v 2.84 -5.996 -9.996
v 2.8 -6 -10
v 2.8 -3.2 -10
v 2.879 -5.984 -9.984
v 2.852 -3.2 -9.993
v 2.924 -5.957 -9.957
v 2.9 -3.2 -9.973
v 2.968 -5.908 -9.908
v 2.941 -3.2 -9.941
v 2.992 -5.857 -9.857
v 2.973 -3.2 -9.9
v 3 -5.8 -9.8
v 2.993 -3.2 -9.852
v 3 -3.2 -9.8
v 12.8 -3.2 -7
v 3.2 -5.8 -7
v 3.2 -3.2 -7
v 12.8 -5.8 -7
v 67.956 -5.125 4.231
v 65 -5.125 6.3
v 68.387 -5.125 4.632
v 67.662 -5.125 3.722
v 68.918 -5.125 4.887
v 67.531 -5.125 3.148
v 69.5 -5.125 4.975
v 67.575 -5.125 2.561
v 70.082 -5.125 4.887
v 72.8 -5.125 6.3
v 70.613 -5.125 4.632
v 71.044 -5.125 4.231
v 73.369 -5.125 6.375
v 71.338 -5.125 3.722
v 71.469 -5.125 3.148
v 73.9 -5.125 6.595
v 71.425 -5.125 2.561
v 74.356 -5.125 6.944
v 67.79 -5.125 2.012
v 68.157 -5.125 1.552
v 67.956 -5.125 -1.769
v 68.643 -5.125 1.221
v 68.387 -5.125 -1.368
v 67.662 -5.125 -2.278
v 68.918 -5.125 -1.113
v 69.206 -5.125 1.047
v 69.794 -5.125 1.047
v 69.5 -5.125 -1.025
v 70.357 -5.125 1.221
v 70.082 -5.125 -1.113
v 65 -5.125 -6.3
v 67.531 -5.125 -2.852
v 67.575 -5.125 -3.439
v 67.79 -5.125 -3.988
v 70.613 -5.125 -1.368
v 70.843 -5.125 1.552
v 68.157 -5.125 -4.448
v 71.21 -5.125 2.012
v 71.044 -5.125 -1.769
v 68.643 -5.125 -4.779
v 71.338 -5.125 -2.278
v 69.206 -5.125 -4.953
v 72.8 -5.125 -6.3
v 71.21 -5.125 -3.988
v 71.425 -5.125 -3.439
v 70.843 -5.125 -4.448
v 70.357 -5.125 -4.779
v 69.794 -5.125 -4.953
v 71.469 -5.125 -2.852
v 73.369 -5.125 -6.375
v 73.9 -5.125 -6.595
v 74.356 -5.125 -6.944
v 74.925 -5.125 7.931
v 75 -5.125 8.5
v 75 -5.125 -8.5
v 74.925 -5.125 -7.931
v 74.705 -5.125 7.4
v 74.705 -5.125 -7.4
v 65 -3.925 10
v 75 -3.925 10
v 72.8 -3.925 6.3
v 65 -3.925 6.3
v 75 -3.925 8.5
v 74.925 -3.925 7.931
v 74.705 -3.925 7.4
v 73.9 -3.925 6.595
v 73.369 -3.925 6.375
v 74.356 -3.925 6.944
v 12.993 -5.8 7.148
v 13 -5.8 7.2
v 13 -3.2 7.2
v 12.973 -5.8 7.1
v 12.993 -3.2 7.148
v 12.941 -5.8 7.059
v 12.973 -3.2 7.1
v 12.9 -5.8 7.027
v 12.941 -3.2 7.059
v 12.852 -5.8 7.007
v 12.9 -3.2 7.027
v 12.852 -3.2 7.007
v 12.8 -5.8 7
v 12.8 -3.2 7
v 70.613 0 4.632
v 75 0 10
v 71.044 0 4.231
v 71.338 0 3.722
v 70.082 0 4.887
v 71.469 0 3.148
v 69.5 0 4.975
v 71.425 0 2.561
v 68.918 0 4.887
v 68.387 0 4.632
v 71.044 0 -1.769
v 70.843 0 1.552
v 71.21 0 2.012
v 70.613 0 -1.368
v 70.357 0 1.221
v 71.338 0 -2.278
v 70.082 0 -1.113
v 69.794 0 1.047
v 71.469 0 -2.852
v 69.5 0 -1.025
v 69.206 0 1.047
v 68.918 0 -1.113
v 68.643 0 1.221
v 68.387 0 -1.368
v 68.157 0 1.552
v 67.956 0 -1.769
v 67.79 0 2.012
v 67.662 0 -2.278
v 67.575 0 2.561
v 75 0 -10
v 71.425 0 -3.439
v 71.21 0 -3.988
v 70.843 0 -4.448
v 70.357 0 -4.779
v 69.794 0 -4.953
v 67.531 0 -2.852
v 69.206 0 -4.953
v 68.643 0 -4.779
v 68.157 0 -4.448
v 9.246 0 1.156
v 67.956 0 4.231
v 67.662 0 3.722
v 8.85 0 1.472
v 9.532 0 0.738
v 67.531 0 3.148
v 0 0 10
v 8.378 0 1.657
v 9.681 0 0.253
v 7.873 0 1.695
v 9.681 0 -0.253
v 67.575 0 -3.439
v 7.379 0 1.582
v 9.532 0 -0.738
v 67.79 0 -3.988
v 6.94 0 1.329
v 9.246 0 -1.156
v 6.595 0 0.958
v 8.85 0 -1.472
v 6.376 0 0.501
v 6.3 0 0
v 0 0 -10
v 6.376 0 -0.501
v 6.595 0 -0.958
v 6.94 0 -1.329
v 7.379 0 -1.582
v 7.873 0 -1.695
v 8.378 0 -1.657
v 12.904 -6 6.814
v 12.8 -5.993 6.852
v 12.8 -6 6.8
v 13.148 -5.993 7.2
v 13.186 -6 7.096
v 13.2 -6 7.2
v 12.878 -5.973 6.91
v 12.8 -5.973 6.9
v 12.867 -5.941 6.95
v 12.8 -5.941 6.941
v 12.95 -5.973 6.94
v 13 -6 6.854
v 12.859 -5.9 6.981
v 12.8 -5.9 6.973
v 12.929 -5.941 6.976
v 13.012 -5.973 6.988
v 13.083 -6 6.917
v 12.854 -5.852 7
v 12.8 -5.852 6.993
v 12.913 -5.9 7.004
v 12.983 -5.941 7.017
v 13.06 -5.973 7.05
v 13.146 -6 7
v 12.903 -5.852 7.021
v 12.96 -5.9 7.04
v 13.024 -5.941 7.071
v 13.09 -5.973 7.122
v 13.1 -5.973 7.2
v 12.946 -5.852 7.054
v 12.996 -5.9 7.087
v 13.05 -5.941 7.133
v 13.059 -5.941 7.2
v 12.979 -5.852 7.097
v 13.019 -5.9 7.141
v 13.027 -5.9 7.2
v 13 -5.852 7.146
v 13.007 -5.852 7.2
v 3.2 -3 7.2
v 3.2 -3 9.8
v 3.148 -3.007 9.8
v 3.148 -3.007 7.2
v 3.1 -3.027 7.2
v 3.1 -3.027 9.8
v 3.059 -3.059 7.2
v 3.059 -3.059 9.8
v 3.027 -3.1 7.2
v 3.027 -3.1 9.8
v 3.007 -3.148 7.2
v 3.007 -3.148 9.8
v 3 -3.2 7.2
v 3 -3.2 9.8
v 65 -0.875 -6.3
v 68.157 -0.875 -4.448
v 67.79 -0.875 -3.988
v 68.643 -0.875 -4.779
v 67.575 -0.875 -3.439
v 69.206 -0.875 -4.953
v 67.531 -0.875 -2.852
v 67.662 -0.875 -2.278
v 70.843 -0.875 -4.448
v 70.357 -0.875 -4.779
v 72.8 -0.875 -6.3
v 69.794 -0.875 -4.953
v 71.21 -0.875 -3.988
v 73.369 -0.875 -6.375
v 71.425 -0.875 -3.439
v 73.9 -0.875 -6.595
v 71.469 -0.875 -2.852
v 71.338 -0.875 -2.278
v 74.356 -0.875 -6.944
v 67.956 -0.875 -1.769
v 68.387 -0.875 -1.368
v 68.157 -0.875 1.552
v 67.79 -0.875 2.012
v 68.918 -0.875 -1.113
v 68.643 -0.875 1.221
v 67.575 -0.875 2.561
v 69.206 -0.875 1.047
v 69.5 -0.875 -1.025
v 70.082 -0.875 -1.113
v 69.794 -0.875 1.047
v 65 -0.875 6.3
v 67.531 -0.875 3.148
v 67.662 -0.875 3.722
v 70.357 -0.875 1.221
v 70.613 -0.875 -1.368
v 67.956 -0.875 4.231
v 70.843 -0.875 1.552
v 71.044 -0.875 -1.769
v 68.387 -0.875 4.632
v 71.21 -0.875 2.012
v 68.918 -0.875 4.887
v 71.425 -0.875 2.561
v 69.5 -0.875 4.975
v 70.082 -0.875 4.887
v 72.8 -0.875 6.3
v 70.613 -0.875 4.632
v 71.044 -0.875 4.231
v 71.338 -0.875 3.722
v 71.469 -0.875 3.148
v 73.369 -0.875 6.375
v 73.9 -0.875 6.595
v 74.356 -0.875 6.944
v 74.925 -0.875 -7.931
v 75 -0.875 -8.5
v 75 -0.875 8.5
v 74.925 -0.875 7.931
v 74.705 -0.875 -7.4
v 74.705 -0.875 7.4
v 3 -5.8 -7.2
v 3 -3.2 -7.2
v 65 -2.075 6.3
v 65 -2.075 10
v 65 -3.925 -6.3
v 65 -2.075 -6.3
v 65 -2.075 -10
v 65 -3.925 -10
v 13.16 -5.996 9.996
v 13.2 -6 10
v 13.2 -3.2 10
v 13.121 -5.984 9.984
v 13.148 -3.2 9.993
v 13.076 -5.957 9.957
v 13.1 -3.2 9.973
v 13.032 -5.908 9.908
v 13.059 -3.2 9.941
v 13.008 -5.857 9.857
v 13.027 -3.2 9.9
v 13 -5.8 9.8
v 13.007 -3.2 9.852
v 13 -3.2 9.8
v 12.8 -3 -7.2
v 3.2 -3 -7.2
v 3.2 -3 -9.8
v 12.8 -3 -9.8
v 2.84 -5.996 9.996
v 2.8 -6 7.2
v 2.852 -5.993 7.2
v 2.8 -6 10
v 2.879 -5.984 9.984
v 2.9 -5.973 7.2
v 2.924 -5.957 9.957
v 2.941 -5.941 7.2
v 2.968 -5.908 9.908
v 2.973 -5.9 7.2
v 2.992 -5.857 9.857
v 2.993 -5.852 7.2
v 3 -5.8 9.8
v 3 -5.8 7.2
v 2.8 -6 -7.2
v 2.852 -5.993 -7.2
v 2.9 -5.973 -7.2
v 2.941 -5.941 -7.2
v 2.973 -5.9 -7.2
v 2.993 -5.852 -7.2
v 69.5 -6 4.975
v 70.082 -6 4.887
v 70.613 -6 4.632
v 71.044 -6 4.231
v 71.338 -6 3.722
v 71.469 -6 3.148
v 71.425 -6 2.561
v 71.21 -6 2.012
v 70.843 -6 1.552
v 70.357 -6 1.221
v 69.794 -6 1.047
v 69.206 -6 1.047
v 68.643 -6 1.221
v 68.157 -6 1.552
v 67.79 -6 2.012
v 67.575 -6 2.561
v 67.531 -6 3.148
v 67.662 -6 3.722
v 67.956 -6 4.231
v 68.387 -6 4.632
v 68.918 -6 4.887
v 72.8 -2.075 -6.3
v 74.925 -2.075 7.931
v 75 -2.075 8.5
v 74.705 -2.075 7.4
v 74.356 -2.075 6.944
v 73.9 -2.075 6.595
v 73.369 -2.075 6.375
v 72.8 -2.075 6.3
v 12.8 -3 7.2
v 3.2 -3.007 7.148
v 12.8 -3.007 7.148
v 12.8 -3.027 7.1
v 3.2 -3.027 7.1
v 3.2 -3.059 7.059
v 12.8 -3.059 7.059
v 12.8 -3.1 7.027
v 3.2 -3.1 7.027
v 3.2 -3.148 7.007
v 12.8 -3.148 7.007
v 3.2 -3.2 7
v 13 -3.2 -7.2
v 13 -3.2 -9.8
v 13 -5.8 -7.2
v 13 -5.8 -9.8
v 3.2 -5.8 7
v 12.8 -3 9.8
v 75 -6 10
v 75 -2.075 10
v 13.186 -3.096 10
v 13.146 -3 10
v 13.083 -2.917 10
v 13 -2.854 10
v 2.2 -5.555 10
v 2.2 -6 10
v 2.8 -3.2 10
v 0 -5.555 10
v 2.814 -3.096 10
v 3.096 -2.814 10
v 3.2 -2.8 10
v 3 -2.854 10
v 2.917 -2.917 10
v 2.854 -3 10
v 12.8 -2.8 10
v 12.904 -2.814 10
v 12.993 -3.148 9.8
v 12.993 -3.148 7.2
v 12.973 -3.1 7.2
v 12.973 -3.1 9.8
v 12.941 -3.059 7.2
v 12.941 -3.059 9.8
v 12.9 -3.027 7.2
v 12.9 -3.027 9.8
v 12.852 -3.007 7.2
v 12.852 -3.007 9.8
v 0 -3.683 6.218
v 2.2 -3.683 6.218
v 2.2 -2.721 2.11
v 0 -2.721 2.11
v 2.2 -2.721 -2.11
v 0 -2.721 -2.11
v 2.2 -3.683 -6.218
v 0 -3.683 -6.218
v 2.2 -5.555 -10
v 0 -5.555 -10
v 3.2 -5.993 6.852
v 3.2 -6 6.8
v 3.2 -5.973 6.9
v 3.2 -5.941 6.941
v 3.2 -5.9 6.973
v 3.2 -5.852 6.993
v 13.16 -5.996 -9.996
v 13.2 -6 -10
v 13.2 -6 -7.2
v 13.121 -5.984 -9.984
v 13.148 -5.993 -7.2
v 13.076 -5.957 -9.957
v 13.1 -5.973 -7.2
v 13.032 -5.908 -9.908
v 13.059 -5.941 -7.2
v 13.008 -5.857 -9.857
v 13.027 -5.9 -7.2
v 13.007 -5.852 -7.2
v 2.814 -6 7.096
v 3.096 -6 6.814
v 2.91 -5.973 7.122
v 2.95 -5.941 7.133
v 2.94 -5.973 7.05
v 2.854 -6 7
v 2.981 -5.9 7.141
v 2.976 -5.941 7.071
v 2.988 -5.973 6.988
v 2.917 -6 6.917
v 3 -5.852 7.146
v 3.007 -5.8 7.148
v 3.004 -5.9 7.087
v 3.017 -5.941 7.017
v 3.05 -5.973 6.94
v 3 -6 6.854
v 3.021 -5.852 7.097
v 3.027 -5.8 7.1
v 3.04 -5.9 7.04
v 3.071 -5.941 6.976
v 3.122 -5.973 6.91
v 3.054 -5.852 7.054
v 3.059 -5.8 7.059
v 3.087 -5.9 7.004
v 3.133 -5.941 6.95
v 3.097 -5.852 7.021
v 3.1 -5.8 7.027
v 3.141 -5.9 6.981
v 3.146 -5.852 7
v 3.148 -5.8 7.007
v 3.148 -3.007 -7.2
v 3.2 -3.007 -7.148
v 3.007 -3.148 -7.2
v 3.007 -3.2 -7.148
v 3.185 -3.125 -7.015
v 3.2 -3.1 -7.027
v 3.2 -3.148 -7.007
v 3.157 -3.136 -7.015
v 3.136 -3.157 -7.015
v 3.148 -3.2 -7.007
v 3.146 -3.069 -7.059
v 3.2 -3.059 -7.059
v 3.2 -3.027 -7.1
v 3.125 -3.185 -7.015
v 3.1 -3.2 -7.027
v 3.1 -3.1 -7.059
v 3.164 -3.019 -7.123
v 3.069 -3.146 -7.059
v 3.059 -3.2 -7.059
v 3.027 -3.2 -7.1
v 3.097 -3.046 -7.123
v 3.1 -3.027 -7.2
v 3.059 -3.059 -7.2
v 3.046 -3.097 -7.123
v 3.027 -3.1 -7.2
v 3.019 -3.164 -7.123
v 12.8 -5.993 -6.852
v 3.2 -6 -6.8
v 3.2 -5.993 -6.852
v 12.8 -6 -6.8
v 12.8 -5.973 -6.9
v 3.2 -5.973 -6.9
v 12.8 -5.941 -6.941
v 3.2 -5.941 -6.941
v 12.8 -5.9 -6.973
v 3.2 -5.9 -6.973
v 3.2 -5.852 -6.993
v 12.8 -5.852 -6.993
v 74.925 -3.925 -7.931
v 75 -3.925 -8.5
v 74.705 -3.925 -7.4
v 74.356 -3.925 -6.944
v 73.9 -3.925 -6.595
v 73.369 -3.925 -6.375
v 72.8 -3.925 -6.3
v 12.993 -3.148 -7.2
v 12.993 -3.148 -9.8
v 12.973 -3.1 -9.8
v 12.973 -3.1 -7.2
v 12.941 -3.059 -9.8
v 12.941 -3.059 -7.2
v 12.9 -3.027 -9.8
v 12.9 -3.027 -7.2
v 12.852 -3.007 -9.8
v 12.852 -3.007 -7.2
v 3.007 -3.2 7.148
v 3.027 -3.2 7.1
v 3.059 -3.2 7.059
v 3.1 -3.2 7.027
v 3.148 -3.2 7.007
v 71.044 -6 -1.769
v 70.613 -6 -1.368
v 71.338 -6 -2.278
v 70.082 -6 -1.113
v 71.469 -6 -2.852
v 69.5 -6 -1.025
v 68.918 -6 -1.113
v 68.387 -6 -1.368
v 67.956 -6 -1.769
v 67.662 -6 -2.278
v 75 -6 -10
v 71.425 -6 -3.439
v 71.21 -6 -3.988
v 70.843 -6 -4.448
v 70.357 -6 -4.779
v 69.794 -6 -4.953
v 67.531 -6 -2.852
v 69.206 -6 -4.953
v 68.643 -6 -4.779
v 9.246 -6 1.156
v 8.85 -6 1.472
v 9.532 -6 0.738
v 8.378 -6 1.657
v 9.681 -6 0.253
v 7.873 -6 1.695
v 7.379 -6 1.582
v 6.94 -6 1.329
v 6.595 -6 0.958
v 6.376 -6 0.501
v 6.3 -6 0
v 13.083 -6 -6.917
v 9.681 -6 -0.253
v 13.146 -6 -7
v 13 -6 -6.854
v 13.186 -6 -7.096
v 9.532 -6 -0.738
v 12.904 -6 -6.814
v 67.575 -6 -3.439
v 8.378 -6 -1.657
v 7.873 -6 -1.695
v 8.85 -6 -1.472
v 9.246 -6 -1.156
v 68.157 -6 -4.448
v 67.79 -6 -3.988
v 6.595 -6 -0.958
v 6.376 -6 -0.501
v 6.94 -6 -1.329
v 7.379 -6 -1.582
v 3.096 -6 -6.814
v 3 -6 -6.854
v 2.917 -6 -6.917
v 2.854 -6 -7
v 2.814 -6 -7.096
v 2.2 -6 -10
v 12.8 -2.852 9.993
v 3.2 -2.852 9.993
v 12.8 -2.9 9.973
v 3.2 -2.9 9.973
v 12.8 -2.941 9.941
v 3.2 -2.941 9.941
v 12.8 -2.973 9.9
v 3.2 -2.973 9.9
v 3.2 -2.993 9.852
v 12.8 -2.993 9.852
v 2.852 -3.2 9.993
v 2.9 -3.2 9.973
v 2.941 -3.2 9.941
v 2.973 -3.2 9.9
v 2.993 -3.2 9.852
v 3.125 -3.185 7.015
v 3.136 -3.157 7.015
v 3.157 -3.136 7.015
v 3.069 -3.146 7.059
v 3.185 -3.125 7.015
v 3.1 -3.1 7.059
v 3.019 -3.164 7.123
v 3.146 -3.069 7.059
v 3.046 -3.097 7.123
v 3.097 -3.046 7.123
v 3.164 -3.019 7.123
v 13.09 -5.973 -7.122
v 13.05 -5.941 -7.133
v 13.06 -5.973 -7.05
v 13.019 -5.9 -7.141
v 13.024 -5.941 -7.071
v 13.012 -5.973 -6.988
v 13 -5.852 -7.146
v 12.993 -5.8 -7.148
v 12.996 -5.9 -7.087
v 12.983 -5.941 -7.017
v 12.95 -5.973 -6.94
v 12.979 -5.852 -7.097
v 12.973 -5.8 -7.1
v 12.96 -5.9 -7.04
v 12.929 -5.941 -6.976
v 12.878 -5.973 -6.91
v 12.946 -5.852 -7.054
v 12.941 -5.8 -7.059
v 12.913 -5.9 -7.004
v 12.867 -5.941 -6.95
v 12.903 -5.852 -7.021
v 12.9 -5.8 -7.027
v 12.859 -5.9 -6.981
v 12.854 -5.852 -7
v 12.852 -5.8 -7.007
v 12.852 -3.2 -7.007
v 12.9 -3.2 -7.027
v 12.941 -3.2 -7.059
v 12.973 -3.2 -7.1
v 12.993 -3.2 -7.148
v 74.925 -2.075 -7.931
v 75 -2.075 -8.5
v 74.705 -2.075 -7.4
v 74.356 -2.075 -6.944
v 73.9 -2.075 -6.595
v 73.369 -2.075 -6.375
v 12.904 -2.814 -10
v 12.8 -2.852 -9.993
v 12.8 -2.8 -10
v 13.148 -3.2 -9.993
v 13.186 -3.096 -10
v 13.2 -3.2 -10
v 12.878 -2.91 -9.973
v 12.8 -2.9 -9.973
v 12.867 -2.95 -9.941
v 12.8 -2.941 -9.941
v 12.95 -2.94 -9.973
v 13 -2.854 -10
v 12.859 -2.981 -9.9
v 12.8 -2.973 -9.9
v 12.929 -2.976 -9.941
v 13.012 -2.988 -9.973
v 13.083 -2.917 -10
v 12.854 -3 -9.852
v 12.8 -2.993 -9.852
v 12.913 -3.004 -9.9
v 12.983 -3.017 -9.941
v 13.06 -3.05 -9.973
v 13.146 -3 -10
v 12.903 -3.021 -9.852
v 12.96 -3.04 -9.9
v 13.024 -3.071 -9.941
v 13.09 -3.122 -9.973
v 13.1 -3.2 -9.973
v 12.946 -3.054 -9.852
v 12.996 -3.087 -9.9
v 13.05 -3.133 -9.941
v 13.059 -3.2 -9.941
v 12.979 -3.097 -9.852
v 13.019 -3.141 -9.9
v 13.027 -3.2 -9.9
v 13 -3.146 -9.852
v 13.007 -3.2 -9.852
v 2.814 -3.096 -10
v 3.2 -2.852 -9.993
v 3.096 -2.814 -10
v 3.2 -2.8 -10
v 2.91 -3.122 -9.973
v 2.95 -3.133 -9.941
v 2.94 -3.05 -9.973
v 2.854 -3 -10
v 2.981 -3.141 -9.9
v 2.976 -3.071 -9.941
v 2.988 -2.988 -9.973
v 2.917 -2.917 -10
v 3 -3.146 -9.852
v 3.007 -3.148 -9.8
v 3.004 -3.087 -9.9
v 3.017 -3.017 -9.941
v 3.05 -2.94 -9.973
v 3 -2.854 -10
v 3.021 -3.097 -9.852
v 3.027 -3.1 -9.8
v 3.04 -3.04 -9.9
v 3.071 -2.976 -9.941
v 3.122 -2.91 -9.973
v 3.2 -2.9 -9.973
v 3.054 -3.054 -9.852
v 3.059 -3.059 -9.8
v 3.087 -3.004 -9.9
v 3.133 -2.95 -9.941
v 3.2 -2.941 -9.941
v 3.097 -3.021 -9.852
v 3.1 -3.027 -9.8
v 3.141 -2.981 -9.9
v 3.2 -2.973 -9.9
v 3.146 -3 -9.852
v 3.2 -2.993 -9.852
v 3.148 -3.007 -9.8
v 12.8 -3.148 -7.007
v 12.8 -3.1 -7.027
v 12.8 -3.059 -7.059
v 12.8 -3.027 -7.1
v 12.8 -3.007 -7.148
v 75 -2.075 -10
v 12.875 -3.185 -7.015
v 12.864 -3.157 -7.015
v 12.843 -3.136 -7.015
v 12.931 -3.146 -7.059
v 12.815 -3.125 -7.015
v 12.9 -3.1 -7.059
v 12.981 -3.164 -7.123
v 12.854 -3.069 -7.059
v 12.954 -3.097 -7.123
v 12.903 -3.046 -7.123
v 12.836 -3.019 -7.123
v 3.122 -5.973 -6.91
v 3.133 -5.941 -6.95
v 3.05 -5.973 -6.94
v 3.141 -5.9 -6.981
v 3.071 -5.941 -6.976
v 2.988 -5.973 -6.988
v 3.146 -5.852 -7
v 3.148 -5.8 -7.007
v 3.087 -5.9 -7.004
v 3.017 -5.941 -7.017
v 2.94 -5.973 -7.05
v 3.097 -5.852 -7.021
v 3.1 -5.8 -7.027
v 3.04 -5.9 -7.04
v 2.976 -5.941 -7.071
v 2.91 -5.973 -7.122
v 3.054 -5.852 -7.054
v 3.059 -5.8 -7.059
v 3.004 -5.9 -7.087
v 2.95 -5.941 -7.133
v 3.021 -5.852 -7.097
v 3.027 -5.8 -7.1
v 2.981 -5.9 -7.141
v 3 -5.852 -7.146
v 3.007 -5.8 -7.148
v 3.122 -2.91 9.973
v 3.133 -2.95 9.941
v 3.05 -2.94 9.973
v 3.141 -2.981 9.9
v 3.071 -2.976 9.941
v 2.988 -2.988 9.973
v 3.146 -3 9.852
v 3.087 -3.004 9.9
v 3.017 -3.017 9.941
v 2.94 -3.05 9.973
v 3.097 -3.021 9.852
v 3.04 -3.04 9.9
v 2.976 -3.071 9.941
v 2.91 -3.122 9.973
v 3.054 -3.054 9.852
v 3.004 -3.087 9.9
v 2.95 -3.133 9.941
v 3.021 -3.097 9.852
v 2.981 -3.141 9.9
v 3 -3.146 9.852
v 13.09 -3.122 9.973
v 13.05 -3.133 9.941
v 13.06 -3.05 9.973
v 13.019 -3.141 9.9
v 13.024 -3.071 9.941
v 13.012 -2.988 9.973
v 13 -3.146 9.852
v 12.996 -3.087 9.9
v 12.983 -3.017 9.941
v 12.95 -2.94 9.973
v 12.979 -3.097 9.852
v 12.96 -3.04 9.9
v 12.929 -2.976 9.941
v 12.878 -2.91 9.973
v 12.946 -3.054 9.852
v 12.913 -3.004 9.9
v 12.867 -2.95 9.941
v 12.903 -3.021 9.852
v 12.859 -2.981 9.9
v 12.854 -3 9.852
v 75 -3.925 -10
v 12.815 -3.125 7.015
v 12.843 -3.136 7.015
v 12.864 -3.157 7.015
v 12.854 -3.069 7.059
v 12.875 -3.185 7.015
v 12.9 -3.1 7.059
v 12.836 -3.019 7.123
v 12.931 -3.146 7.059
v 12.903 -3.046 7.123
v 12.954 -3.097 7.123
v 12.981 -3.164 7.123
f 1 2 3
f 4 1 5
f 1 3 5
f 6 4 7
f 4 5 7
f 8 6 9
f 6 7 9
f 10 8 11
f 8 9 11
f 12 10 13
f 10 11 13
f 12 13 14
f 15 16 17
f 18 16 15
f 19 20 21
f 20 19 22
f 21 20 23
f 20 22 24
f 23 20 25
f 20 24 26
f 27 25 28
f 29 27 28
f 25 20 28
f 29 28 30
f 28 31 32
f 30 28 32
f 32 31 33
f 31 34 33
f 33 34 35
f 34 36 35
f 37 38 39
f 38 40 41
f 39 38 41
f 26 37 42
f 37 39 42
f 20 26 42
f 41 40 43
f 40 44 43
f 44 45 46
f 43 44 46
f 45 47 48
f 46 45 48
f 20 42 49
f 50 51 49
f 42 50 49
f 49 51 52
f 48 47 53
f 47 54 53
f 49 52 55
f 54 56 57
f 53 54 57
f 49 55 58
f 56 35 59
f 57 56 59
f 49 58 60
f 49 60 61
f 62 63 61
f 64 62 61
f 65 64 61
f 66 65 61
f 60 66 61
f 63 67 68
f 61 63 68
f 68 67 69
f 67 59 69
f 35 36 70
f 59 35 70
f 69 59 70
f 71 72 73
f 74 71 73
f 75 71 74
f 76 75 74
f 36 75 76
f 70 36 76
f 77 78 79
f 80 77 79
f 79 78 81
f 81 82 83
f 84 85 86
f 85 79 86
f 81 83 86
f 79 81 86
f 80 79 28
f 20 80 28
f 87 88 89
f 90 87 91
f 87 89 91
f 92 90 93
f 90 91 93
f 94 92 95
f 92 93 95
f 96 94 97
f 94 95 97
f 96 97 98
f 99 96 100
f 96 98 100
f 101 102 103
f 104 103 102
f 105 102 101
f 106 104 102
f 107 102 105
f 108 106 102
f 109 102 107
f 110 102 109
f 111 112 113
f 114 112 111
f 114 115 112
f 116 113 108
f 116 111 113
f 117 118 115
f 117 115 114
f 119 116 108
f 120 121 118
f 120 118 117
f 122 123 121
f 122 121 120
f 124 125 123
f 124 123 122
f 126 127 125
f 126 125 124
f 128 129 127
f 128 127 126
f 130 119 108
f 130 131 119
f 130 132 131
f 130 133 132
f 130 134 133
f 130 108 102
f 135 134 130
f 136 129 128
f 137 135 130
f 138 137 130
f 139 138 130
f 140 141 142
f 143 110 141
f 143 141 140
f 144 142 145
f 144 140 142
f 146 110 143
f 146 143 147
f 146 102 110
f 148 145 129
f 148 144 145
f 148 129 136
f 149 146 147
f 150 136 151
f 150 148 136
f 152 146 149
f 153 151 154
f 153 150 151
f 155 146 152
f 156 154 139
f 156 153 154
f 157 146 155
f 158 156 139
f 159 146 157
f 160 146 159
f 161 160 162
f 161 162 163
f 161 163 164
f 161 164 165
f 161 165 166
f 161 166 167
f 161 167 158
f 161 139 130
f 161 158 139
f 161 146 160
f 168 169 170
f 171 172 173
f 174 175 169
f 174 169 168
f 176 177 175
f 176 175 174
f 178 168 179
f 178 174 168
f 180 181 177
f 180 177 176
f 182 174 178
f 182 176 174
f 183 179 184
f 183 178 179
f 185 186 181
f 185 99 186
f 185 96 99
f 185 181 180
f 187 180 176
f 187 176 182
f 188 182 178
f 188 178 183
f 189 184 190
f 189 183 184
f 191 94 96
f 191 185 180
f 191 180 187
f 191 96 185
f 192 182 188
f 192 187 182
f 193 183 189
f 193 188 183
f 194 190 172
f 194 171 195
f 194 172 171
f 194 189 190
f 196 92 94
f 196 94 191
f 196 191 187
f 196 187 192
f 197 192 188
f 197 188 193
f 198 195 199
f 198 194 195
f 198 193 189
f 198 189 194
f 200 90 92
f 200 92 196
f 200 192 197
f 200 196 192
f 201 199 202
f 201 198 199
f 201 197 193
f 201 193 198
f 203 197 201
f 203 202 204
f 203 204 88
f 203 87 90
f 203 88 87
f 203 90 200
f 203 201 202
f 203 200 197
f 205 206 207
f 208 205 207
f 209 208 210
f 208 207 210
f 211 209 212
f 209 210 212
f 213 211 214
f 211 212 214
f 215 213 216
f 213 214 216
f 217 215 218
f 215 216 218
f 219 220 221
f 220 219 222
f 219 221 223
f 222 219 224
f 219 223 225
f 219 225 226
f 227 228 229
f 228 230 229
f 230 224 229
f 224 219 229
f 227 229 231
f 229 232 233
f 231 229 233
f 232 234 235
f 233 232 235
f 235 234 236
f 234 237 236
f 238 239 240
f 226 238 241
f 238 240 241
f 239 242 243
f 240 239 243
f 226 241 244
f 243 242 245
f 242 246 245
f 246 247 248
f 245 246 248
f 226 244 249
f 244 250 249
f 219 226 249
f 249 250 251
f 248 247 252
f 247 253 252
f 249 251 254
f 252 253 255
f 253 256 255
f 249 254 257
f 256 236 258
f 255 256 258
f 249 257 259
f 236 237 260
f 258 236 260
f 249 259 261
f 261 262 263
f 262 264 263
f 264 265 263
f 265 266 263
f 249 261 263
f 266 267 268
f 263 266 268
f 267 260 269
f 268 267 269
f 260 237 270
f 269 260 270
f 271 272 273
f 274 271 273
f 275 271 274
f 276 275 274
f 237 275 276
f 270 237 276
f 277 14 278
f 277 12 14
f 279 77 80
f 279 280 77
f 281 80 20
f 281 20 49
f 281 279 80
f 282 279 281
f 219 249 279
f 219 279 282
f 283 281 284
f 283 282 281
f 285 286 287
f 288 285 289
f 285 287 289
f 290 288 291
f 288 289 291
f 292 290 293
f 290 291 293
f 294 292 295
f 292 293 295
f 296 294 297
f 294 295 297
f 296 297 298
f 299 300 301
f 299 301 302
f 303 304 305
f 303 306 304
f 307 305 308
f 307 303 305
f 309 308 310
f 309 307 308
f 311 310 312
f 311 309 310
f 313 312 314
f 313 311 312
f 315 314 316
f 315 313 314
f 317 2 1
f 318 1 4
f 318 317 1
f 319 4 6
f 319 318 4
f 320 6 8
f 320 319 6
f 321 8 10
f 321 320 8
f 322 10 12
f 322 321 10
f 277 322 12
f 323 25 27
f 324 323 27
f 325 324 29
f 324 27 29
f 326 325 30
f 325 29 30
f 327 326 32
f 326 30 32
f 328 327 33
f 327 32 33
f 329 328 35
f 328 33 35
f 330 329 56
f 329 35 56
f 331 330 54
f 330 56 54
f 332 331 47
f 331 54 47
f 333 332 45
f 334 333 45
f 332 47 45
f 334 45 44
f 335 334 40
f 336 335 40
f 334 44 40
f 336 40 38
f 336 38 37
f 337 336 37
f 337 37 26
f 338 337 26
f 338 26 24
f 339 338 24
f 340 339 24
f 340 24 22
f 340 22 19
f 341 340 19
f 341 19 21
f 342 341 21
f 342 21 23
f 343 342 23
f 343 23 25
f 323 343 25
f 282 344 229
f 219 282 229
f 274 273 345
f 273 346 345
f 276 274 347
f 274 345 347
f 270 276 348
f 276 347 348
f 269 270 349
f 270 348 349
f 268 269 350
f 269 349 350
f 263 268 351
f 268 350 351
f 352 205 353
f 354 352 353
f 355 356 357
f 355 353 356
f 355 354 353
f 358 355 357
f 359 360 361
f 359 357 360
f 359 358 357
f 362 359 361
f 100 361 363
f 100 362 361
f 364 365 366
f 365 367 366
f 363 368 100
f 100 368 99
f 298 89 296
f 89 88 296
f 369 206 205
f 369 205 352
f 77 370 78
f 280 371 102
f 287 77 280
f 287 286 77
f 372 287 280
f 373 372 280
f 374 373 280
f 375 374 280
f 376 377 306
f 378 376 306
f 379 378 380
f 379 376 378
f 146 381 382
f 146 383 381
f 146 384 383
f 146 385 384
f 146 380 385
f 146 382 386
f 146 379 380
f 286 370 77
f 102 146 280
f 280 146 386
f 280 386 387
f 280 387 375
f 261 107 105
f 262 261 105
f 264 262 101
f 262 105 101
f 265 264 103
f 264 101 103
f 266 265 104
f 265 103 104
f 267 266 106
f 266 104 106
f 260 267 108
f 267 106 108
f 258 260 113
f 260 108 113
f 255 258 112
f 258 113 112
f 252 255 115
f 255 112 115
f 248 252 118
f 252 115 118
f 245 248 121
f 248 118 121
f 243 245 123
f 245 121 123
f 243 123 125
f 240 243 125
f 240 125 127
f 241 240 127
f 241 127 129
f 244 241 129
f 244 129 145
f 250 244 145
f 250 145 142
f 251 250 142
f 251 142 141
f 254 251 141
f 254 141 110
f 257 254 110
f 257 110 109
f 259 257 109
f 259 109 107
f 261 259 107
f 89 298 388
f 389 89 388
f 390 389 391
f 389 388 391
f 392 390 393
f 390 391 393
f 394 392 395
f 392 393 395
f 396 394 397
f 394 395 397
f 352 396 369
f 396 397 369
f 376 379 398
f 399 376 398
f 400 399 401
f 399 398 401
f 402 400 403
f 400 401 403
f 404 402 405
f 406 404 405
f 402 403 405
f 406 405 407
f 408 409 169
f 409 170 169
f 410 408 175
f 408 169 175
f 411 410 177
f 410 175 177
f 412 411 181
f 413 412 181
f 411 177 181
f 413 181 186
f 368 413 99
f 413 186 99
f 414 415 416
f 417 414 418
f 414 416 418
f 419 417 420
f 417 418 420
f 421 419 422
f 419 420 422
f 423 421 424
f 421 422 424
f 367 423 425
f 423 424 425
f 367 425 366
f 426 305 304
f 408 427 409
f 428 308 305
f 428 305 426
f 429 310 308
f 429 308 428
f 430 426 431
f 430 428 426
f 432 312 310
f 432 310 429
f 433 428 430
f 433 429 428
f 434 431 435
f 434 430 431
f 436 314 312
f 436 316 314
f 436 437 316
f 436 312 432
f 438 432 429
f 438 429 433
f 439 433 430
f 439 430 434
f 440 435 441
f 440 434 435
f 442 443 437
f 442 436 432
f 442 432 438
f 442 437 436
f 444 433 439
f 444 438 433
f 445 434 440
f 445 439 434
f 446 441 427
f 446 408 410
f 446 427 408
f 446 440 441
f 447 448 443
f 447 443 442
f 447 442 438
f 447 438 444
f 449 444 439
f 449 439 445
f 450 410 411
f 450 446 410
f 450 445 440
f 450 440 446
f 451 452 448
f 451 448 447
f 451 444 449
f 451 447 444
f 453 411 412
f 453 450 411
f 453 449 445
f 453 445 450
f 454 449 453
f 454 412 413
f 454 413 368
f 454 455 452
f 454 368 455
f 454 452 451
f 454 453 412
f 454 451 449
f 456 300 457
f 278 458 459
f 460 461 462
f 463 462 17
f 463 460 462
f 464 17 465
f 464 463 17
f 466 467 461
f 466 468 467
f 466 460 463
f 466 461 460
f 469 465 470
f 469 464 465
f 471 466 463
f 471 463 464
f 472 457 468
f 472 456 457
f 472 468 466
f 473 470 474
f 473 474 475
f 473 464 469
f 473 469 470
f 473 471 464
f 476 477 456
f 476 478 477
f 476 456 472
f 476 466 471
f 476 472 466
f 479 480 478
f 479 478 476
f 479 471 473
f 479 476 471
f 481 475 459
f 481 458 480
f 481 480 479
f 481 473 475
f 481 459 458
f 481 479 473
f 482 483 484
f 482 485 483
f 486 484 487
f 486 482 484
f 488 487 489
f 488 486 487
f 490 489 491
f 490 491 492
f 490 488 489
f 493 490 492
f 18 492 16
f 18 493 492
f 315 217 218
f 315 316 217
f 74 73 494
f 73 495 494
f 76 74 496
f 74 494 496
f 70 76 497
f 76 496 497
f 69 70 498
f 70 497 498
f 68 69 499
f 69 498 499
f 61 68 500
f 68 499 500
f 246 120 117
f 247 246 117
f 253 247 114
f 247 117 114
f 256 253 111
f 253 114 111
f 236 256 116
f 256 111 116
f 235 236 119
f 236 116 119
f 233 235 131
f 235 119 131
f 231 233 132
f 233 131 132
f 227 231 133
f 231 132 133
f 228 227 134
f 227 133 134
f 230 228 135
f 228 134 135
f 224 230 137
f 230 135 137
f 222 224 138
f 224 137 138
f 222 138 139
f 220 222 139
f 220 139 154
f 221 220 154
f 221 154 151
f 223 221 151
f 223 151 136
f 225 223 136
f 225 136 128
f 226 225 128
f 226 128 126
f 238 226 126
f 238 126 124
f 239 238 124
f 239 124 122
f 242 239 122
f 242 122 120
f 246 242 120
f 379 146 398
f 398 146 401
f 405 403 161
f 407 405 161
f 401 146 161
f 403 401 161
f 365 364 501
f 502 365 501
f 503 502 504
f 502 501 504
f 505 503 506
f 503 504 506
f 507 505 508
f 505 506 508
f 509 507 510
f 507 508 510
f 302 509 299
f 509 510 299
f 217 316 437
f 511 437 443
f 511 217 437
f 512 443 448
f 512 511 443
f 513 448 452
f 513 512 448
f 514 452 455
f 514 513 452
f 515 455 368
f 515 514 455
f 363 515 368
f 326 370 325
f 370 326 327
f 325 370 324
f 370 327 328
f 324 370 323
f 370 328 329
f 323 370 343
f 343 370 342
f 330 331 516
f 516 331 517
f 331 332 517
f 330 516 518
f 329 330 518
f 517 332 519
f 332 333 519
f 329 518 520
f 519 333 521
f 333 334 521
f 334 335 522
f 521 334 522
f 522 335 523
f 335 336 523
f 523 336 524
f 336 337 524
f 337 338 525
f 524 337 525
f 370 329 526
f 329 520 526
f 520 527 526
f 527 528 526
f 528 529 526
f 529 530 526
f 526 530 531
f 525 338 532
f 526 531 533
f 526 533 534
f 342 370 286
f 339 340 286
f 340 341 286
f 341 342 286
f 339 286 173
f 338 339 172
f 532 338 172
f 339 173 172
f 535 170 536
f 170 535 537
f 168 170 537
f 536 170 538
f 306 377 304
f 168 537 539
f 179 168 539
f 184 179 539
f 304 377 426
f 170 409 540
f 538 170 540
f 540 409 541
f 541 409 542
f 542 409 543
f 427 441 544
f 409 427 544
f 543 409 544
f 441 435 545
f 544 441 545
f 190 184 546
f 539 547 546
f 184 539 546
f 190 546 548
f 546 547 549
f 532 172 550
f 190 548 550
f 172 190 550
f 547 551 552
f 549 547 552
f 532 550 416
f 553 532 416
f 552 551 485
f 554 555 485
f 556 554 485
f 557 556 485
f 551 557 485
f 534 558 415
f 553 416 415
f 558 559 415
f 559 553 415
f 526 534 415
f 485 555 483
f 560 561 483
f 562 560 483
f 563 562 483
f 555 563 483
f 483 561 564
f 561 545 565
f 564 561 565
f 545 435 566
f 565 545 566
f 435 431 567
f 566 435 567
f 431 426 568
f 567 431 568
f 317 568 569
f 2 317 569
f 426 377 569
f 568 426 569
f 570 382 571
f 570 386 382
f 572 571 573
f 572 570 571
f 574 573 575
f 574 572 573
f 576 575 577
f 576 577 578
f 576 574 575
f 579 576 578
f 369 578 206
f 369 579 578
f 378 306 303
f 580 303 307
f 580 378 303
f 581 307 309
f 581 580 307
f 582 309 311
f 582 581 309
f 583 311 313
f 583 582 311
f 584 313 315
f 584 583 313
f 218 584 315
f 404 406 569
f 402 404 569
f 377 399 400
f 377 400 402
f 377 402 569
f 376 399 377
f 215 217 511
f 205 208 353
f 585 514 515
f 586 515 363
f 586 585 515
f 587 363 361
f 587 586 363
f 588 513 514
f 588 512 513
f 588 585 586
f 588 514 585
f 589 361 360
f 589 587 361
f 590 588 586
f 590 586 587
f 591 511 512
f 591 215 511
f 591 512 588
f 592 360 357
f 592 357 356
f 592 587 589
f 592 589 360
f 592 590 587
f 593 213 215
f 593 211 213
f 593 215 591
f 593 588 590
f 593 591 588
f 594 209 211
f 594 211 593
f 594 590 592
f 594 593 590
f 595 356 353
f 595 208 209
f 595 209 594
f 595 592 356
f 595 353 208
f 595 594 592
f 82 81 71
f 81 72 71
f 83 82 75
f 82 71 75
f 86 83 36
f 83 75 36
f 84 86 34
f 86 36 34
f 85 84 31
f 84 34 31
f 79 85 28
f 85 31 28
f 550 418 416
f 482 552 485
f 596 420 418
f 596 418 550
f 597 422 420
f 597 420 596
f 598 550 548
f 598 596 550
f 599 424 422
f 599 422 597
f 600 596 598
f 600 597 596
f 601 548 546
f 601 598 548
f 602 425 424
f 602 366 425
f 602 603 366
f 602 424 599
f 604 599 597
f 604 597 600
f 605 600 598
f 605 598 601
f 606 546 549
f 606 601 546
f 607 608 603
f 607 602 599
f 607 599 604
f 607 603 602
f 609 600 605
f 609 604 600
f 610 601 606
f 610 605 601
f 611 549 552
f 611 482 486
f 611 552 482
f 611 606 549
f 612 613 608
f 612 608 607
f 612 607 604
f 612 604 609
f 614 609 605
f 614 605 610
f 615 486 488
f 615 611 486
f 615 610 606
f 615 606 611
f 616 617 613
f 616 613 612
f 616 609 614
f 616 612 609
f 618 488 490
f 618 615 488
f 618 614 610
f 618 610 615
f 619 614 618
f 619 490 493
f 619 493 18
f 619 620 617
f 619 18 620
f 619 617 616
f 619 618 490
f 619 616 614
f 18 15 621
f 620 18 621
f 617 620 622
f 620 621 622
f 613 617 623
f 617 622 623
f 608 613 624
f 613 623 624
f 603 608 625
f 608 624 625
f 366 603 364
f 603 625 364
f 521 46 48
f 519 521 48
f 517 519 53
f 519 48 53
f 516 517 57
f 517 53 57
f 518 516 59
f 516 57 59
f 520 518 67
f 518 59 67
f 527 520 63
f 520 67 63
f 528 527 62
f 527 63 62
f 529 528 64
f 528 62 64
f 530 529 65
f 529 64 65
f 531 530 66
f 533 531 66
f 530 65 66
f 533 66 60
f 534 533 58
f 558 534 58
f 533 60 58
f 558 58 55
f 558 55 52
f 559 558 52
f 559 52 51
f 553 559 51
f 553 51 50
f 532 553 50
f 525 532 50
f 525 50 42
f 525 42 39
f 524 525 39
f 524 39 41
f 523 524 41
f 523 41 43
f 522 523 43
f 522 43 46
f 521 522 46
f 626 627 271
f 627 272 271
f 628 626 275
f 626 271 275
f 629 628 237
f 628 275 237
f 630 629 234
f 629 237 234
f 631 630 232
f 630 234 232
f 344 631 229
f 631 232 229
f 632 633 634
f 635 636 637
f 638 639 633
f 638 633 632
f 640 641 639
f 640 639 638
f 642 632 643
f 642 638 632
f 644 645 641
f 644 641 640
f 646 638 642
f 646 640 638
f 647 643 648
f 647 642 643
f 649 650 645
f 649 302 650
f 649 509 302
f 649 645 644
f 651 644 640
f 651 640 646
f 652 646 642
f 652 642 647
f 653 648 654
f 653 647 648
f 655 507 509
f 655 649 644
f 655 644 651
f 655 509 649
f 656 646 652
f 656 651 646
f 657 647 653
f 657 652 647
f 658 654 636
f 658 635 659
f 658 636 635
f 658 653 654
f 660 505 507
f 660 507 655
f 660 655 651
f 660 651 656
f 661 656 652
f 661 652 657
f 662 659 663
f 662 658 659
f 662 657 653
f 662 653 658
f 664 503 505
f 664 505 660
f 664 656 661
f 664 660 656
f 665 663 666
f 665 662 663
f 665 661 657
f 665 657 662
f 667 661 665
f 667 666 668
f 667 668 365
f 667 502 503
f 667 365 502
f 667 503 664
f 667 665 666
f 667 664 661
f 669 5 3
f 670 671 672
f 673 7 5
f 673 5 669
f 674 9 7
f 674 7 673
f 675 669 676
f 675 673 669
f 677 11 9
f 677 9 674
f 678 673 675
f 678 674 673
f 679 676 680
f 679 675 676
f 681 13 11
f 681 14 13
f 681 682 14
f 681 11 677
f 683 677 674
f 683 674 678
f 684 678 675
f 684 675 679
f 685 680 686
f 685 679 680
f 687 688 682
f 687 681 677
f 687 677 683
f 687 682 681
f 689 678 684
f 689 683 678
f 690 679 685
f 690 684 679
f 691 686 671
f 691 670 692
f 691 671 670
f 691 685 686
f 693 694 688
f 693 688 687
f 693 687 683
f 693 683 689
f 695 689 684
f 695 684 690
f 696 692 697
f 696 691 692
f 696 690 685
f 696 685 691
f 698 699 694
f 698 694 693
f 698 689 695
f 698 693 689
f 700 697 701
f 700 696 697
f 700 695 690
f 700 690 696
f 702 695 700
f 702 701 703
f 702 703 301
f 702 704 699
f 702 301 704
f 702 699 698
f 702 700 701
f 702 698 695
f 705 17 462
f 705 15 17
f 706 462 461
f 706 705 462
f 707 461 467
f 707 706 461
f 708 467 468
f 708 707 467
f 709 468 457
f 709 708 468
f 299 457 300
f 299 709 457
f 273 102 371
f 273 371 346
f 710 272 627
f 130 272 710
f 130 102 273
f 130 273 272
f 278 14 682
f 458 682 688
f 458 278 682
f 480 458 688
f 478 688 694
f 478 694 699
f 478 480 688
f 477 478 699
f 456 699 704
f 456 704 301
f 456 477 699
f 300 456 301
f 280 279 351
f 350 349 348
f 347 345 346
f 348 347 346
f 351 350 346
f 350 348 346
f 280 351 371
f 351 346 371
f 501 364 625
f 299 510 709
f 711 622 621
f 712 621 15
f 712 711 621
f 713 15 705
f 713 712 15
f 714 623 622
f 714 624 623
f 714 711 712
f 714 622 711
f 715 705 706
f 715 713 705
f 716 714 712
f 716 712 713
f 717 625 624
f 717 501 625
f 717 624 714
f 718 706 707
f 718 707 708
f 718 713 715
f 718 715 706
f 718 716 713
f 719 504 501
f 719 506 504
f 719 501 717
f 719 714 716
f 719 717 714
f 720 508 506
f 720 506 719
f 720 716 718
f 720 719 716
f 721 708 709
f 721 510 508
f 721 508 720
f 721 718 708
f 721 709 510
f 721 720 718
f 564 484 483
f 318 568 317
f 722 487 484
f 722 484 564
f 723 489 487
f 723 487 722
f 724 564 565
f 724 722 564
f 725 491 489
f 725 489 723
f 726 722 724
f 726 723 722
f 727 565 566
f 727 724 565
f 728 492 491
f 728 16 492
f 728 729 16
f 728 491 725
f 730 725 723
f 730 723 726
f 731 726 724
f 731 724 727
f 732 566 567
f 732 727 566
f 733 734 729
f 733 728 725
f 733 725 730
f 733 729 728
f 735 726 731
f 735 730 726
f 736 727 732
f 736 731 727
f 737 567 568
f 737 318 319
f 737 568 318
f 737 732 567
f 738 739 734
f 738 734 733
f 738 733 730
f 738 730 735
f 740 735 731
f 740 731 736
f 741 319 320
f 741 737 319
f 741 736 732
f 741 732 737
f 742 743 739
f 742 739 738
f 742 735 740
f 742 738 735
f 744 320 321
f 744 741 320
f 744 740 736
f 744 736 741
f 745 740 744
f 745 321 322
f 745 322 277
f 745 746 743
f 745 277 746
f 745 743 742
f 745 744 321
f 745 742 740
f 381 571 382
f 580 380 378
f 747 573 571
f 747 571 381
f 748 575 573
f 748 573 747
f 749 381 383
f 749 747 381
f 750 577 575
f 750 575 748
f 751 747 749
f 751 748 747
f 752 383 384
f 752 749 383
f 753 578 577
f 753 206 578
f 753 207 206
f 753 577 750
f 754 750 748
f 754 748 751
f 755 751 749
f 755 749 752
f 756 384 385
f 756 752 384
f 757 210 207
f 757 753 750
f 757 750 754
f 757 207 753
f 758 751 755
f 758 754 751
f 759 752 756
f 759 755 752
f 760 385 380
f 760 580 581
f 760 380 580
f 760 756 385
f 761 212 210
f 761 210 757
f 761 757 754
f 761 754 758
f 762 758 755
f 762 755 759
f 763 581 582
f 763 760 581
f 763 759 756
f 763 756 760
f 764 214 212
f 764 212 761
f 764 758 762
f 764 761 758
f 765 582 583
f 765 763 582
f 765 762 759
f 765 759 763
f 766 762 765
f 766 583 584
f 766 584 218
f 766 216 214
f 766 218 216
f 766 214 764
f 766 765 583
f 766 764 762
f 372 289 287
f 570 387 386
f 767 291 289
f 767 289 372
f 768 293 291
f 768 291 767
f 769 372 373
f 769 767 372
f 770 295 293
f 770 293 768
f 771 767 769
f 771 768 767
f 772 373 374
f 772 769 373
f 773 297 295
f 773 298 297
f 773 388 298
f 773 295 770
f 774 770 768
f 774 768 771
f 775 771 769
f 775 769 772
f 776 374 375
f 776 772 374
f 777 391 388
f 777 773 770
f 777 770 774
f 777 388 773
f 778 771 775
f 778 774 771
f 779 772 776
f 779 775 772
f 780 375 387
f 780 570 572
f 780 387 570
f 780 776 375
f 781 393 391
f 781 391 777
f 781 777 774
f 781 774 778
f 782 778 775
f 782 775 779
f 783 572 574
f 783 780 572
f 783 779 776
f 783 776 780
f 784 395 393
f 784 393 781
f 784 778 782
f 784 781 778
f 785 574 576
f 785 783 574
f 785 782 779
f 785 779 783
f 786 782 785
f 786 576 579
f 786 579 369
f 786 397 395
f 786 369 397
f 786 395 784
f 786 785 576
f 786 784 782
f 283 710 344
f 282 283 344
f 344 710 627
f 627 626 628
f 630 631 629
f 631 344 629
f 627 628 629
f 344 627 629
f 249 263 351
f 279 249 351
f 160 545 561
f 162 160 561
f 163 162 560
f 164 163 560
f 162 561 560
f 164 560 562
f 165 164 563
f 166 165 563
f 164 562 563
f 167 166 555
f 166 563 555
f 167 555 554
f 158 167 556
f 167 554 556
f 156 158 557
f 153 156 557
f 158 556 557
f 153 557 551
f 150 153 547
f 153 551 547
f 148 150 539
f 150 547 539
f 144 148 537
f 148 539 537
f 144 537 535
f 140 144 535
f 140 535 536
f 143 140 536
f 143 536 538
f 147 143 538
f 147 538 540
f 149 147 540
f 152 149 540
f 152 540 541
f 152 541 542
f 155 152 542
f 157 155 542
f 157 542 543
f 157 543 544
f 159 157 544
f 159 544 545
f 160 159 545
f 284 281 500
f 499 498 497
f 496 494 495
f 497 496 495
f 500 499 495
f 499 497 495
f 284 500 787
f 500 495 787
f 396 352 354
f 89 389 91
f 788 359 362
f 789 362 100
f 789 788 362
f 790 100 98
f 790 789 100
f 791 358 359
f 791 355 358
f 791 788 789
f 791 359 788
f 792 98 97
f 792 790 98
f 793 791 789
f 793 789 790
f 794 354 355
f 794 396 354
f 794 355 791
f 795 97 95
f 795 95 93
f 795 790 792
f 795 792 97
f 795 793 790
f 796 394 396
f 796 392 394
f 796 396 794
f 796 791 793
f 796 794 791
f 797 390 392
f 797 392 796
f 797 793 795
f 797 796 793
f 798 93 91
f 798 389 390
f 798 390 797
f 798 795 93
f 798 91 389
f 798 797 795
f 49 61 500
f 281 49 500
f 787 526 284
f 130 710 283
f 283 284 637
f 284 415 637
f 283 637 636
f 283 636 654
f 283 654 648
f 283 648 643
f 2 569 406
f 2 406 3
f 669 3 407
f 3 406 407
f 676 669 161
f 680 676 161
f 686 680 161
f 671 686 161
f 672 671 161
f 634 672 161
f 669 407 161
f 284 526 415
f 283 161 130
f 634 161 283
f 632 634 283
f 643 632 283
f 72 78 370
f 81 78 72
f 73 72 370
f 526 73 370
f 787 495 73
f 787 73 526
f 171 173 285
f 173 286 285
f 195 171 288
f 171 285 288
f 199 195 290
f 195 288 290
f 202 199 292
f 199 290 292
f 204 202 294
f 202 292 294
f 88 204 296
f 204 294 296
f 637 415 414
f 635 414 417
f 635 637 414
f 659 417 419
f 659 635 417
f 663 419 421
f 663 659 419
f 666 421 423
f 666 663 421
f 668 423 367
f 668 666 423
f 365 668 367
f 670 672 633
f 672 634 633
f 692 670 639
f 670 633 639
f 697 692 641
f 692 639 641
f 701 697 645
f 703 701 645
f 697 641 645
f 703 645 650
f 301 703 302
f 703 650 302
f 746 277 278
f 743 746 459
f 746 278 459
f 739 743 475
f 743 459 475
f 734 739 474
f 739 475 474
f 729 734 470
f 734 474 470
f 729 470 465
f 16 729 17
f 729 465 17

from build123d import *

# Parameters (mm, degrees)
SKETCH1_W            = 20
SKETCH1_H            = 6
BOSS_EXTRUDE1_DEPTH  = 75
M3_CLEARANCE_HOLE1_D = 3.4
SKETCH4_R            = 1.975
CUT_EXTRUDE1_DEPTH   = 76.901251637
CUT_EXTRUDE2_DEPTH   = 10
SKETCH6_W            = 10
SKETCH6_H            = 3
CUT_EXTRUDE3_DEPTH   = 3
FILLET1_R            = 0.2
FILLET2_R            = 2.2
CUT_EXTRUDE5_DEPTH   = 2.2


with BuildPart() as part:
    # Sketch1 → Boss-Extrude1 (new body)
    with BuildSketch(Plane(origin=(0, 0, 0), x_dir=(0, 0, -1), z_dir=(1, 0, 0))):
        with Locations((0, -3)):
            Rectangle(SKETCH1_W, SKETCH1_H)
    extrude(amount=BOSS_EXTRUDE1_DEPTH)

    # M3 Clearance Hole1 (through all)
    with Locations(Plane(origin=(0, 0, 0), x_dir=(1, 0, 0), z_dir=(0, 1, 0))):
        with Locations((8, 0)):
            Hole(M3_CLEARANCE_HOLE1_D / 2)

    # Sketch4 → Cut-Extrude1 (cut, through all)
    with BuildSketch(Plane(origin=(0, 0, 0), x_dir=(1, 0, 0), z_dir=(0, 1, 0))):
        with Locations(Location((69.5, 3, 0), (0, 0, 270))):
            Circle(SKETCH4_R)
        with Locations(Location((69.5, -3, 0), (0, 0, 270))):
            Circle(SKETCH4_R)
    extrude(amount=-CUT_EXTRUDE1_DEPTH, mode=Mode.SUBTRACT)

    # Sketch5 → Cut-Extrude2 (cut)
    with BuildSketch(Plane(origin=(75, 0, 0), x_dir=(0, 0, -1), z_dir=(1, 0, 0))):
        Polygon((-10, -3.925), (-6.3, -3.925), (-6.3, -5.125), (6.3, -5.125), (6.3, -3.925), (10, -3.925), (10, -2.075), (6.3, -2.075), (6.3, -0.875), (-6.3, -0.875), (-6.3, -2.075), (-10, -2.075), align=None)
    extrude(amount=-CUT_EXTRUDE2_DEPTH, mode=Mode.SUBTRACT)

    # Sketch6 → Cut-Extrude3 (cut)
    with BuildSketch(Plane.XZ.offset(6)):
        with Locations((8, 8.5)):
            Rectangle(SKETCH6_W, SKETCH6_H)
        with Locations((8, -8.5)):
            Rectangle(SKETCH6_W, SKETCH6_H)
    extrude(amount=-CUT_EXTRUDE3_DEPTH, mode=Mode.SUBTRACT)

    # Fillet1
    fillet1_edges = [part.edges().sort_by_distance(p)[0] for p in [
        (3, -3, 8.5),
        (3, -4.5, 7),
        (8, -3, 10),
        (3, -4.5, 10),
        (13, -3, 8.5),
        (13, -4.5, 10),
        (8, -3, 7),
        (13, -4.5, 7),
        (3, -6, 8.5),
        (8, -6, 7),
        (13, -6, 8.5),
        (13, -3, -8.5),
        (13, -4.5, -7),
        (8, -3, -10),
        (13, -4.5, -10),
        (3, -3, -8.5),
        (3, -4.5, -10),
        (8, -3, -7),
        (3, -4.5, -7),
        (13, -6, -8.5),
        (8, -6, -7),
        (3, -6, -8.5),
    ]]
    fillet(fillet1_edges, radius=FILLET1_R)

    # Fillet2
    fillet2_edges = [part.edges().sort_by_distance(p)[0] for p in [
        (75, -1.475, -6.3),
        (75, -1.475, 6.3),
        (75, -4.525, 6.3),
        (75, -4.525, -6.3),
    ]]
    fillet(fillet2_edges, radius=FILLET2_R)

    # Sketch12 → Cut-Extrude5 (cut)
    with BuildSketch(Plane.ZY):
        with BuildLine():
            ThreePointArc((10, -5.554612339), (0, -2.6), (-10, -5.554612339))
            Line((-10, -5.554612339), (-10, -6))
            Line((-10, -6), (10, -6))
            Line((10, -6), (10, -5.554612339))
        make_face()
        with BuildLine():
            Line((-10, -6), (-10, -5.554612339))
            ThreePointArc((-10, -5.554612339), (-8.79090439, -37.164157881), (18.4, -21))
            ThreePointArc((18.4, -21), (16.164157881, -12.20909561), (10, -5.554612339))
            Line((10, -5.554612339), (10, -6))
            Line((10, -6), (-10, -6))
        make_face()
    extrude(amount=-CUT_EXTRUDE5_DEPTH, mode=Mode.SUBTRACT)


solid = part.part
